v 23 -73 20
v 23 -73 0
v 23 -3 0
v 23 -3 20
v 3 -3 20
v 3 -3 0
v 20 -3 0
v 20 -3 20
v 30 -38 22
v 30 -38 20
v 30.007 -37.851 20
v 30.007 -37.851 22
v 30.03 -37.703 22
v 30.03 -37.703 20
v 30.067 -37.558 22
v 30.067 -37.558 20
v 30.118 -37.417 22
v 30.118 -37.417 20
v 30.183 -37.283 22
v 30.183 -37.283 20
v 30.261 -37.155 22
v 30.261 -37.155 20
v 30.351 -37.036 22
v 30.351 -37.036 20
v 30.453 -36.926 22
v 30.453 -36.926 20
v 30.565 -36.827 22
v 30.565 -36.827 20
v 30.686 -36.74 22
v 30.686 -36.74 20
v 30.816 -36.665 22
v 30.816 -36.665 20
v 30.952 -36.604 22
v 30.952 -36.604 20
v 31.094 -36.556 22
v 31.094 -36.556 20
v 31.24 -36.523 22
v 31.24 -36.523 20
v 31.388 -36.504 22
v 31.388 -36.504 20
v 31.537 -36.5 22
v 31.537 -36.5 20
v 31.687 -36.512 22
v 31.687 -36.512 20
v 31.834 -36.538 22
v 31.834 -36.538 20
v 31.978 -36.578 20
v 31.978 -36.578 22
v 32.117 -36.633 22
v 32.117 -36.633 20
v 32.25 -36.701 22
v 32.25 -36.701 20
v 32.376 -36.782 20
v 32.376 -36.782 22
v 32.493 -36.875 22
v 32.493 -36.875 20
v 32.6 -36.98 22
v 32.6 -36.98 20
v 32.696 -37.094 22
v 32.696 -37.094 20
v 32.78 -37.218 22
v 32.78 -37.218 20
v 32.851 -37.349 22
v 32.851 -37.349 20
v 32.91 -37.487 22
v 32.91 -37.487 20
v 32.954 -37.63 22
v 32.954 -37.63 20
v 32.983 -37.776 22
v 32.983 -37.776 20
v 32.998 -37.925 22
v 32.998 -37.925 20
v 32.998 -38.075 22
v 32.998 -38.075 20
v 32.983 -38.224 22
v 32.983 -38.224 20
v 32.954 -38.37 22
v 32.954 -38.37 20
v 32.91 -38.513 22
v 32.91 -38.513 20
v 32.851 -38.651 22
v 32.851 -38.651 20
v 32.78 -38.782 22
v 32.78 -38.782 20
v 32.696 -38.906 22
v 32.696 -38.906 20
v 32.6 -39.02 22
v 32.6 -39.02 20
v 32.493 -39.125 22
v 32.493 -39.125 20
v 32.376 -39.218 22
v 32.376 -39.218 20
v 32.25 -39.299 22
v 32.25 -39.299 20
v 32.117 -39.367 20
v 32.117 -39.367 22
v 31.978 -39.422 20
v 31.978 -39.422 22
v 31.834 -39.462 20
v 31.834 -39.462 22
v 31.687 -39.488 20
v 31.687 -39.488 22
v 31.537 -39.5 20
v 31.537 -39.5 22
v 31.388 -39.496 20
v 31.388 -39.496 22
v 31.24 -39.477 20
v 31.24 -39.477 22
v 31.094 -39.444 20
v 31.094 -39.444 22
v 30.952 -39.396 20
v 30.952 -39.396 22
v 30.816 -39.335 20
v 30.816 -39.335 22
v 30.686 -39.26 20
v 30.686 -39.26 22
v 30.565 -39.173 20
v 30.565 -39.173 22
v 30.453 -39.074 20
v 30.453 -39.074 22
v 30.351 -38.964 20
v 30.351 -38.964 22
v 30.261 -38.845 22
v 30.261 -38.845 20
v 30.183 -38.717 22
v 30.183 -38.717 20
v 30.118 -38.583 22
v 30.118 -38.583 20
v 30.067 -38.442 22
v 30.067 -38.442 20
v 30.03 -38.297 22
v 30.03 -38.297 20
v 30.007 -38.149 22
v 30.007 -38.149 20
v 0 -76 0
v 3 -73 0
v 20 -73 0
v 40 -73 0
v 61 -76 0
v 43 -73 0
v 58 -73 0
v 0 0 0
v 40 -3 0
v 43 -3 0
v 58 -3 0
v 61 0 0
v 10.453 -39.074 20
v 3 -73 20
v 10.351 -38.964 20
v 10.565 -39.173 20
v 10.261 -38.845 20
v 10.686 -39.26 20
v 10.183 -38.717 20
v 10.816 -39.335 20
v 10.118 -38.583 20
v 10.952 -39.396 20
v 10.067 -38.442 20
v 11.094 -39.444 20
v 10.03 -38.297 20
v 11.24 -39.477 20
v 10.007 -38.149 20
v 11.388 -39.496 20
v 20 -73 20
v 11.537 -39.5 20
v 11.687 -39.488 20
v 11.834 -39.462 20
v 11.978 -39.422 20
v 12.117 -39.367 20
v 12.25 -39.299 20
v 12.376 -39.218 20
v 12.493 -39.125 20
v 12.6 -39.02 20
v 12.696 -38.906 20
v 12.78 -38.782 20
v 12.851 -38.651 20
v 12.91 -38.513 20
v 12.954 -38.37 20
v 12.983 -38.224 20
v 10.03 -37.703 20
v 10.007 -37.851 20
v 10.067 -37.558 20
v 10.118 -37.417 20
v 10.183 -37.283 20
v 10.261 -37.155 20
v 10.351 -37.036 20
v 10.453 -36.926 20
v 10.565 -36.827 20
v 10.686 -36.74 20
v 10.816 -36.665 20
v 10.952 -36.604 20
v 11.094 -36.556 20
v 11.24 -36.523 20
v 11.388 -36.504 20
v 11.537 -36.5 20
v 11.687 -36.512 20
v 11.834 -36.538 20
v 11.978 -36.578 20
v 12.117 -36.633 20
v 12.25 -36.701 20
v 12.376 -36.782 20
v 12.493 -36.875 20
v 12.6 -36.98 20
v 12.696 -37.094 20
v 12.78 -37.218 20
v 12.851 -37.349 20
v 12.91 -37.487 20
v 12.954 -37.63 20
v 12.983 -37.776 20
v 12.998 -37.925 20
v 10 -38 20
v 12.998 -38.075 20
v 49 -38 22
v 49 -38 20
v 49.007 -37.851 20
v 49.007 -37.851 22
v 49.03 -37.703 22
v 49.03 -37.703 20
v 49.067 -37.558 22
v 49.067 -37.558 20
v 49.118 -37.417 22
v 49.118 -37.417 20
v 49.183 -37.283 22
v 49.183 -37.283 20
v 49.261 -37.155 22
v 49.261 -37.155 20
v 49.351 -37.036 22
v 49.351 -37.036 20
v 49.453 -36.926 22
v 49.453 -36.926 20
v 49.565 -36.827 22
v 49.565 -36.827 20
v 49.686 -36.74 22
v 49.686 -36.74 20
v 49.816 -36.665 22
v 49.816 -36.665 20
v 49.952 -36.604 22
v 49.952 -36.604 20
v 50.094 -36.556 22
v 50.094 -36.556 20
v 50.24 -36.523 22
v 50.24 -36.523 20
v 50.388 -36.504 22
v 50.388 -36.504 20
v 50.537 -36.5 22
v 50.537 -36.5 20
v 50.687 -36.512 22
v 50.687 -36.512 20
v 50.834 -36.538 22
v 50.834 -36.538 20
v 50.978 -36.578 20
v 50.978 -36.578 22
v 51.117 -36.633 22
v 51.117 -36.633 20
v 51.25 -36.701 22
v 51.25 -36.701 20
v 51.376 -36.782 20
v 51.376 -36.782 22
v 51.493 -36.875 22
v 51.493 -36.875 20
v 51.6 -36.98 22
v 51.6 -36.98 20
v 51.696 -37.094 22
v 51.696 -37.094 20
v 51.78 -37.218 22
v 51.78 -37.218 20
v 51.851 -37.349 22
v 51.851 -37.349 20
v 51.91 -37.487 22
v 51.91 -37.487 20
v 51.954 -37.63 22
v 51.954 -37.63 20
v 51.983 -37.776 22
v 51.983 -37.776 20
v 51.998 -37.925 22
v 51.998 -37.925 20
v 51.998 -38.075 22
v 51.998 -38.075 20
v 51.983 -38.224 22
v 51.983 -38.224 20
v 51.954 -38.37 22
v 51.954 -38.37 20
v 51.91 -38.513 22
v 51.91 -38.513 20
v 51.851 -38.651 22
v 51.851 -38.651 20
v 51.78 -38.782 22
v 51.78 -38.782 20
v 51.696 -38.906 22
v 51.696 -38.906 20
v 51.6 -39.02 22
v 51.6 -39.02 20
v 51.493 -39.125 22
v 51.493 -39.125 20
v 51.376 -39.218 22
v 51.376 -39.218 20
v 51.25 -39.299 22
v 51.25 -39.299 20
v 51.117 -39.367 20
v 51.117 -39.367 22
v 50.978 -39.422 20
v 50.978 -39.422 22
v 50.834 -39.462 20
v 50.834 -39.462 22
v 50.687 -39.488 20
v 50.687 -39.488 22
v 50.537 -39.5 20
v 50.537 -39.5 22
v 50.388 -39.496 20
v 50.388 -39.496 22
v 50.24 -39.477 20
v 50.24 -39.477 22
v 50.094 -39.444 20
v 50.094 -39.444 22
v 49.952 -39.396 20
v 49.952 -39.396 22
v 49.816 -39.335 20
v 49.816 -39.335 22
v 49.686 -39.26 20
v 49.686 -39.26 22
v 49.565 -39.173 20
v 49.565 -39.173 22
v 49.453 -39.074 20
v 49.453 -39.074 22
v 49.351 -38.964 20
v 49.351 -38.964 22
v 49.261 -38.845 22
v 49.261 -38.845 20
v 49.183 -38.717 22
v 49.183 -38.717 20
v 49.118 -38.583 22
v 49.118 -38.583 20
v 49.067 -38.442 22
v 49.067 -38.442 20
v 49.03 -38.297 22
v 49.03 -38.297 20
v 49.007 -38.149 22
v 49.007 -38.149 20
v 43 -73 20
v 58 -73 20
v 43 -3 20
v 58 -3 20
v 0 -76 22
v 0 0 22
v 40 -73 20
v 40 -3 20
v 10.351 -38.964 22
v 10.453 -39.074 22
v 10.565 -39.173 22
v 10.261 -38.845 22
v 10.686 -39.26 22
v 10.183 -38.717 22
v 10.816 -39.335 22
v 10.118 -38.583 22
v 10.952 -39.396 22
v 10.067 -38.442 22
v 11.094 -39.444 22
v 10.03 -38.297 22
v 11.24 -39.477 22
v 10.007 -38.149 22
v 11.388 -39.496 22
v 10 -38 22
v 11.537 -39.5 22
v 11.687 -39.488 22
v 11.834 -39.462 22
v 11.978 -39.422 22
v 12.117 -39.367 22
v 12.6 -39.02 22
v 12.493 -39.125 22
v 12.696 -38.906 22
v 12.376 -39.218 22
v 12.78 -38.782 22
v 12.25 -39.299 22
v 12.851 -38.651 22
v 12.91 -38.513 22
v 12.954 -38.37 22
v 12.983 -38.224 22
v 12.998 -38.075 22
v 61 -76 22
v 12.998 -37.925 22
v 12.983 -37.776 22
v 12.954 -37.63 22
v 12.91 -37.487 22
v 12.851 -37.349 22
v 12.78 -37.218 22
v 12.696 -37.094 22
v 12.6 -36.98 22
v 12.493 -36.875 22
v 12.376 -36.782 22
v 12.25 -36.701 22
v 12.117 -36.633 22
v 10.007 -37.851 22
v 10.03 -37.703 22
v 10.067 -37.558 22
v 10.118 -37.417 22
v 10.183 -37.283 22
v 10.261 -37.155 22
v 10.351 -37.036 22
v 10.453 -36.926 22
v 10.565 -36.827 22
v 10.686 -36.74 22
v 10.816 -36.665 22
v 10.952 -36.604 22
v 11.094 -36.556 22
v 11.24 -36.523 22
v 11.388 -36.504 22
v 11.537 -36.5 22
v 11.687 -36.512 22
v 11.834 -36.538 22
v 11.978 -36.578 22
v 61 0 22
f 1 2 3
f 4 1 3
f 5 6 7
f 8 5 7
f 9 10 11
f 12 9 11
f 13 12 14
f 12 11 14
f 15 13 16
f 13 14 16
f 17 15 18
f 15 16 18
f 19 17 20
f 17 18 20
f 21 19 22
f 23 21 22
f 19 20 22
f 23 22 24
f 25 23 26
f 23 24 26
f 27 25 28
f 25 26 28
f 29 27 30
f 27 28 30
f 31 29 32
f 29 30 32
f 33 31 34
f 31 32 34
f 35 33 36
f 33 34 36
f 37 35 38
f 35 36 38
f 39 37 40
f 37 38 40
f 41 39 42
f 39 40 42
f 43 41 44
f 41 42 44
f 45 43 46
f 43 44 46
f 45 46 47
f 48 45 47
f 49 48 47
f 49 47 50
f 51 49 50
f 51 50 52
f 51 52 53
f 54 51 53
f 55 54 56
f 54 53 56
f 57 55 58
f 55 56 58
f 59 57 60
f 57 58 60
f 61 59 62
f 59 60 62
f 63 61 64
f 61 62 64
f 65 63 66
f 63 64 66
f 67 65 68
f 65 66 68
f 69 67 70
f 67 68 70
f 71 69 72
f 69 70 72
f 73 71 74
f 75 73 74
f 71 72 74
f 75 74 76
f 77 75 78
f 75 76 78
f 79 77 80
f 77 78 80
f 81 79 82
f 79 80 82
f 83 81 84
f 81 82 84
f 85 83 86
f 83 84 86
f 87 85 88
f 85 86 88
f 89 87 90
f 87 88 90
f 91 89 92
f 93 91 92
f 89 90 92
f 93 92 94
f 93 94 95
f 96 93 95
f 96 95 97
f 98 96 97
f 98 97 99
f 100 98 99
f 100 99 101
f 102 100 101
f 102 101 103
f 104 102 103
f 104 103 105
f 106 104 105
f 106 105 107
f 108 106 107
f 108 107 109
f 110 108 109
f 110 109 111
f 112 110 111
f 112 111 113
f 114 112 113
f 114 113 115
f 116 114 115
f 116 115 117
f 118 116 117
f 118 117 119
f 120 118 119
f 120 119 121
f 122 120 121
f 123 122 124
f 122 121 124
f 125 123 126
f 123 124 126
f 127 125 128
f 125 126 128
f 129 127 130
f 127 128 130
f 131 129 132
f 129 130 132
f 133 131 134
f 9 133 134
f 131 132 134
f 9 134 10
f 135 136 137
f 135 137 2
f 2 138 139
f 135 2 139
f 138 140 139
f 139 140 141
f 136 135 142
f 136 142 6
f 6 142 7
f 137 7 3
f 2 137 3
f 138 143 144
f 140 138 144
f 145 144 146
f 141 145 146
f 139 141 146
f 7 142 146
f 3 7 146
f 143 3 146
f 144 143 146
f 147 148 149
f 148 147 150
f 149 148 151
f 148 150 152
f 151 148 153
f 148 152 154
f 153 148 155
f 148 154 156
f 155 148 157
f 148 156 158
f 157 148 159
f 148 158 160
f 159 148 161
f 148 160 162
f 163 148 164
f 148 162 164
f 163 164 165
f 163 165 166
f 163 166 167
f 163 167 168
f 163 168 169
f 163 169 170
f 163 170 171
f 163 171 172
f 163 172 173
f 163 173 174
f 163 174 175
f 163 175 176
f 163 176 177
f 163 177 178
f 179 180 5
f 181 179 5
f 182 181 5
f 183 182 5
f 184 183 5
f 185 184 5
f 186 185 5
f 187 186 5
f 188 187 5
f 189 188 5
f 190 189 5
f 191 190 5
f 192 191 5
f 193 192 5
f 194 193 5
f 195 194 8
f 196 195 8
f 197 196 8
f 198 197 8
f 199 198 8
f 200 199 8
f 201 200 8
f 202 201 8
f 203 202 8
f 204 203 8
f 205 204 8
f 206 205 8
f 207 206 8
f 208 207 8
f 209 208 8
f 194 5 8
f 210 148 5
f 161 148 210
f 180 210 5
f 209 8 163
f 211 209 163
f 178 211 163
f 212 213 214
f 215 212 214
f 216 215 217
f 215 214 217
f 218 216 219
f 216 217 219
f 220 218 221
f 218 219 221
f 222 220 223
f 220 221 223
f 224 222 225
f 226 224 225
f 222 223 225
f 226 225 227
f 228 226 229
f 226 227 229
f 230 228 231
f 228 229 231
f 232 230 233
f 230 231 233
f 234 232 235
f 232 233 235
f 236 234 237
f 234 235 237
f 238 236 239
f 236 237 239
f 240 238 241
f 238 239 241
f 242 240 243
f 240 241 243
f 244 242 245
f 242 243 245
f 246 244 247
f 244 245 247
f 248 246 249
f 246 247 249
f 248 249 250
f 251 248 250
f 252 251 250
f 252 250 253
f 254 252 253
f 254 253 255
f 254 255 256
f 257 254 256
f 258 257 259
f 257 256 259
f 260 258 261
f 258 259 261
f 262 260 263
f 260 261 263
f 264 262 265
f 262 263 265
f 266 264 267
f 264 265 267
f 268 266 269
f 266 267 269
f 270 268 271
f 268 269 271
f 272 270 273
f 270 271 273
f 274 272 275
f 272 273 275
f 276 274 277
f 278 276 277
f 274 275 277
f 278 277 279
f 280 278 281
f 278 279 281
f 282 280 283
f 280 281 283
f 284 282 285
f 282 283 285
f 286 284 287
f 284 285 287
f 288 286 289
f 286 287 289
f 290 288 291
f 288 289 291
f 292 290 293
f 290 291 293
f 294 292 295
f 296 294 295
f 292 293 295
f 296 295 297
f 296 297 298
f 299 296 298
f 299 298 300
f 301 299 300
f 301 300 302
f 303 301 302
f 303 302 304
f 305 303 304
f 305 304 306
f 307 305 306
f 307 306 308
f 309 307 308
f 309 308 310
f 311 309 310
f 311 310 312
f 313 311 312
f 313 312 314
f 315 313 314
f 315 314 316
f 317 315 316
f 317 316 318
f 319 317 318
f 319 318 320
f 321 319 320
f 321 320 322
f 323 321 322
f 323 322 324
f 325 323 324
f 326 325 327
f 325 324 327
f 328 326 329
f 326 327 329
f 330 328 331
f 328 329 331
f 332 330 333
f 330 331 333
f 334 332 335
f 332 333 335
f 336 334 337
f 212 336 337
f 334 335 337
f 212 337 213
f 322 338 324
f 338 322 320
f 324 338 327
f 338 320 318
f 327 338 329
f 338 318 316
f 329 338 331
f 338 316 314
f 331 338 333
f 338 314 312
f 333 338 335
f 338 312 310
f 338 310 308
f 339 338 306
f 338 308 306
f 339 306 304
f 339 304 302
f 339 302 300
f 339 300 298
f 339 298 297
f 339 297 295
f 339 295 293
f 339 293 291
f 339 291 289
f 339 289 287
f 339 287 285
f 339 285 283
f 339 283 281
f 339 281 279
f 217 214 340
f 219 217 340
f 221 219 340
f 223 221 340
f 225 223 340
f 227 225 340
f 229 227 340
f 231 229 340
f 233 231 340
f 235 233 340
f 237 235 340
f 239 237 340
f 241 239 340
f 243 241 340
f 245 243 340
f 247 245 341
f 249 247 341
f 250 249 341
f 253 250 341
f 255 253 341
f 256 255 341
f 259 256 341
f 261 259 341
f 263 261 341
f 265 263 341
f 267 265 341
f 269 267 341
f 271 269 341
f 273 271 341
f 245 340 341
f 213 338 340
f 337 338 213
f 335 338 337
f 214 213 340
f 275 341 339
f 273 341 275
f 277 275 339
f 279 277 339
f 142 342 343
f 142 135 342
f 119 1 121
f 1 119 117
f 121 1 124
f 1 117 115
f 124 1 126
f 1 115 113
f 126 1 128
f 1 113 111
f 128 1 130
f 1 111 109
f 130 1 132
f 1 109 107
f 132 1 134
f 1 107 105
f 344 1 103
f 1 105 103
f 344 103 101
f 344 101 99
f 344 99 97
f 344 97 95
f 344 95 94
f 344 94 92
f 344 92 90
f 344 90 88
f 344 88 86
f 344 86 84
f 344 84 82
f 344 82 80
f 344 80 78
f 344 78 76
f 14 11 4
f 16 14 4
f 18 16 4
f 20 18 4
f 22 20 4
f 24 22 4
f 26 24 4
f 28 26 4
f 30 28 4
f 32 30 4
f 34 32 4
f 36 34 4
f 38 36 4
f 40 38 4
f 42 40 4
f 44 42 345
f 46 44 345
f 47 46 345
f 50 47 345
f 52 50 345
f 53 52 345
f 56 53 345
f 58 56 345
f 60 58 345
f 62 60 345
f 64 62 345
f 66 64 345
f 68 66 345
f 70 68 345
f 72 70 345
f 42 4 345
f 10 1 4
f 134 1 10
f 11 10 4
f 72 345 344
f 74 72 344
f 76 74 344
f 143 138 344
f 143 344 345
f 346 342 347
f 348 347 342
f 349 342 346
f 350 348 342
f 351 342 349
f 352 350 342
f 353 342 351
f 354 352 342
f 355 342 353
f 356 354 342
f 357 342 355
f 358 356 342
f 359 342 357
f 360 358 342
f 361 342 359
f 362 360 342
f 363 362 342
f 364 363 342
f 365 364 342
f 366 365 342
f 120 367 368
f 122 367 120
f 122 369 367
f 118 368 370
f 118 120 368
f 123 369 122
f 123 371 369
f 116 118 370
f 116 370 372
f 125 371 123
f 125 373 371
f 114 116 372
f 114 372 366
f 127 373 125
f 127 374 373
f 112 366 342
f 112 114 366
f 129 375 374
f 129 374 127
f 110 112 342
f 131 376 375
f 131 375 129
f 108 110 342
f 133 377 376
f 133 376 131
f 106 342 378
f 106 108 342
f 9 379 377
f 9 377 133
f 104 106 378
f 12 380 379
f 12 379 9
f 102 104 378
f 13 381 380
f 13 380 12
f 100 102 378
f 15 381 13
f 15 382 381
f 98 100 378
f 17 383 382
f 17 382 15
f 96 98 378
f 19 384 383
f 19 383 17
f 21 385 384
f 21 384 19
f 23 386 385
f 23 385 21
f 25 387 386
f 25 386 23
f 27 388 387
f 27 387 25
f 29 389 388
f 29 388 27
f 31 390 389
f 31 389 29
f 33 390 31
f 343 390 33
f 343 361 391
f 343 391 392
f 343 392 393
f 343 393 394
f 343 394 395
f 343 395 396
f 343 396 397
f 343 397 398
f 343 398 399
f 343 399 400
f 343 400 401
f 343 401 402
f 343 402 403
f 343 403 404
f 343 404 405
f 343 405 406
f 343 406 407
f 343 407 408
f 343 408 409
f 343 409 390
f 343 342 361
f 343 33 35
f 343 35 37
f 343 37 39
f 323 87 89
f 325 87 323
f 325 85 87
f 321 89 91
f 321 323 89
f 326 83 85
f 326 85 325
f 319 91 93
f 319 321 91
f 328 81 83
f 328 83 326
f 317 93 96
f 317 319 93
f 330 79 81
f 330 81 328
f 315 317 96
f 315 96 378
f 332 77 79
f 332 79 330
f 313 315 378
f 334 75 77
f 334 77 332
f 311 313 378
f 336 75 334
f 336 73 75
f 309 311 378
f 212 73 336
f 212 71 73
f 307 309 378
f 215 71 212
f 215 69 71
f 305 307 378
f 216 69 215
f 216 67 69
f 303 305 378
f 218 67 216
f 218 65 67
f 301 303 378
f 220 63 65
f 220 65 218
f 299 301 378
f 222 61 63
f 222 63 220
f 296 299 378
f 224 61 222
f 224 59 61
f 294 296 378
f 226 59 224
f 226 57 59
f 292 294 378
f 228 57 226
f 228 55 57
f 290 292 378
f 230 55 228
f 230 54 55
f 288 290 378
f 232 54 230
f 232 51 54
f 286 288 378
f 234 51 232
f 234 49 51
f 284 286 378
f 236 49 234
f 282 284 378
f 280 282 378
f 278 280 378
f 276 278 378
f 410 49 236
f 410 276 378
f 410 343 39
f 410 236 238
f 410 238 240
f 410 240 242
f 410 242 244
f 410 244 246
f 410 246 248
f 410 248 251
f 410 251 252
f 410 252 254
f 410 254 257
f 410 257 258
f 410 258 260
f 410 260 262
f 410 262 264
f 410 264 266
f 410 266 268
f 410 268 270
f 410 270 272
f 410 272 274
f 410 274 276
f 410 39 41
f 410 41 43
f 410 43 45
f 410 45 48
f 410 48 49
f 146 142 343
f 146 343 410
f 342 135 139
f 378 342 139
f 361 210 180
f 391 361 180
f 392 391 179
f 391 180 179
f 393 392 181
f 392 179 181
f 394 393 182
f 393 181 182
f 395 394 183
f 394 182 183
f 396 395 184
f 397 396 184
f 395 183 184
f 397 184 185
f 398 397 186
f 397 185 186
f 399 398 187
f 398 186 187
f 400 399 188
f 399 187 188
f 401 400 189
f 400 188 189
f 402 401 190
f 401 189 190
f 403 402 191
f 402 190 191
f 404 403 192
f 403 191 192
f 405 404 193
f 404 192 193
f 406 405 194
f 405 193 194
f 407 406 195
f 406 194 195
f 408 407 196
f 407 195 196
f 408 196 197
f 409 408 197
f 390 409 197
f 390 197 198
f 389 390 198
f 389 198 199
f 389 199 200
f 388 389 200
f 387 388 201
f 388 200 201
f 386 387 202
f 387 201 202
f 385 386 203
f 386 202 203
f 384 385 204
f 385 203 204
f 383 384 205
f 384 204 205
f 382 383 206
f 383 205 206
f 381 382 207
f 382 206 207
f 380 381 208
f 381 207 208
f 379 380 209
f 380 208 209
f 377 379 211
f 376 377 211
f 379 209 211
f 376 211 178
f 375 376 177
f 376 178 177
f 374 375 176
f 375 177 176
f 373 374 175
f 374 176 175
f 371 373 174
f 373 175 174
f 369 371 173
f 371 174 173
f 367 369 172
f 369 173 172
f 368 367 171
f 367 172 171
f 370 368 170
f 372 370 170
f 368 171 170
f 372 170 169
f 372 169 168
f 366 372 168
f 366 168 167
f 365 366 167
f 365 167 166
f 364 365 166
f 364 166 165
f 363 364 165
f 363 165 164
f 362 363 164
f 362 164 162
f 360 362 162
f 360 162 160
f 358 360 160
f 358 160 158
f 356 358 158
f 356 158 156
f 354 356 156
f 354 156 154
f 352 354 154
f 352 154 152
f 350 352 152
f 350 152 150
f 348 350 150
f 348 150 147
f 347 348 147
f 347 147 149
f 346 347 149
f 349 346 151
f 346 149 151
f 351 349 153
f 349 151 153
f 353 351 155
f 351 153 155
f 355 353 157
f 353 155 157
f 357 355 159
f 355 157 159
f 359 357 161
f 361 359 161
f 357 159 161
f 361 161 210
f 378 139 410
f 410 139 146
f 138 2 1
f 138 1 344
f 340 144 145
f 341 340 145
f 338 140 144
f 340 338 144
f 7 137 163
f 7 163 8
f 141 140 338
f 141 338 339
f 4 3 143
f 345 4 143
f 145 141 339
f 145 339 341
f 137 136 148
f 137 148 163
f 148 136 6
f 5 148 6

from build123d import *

# Parameters (mm, degrees)
SKETCH1_W               = 81
SKETCH1_H               = 76
SKETCH1_W_2             = 17
SKETCH1_H_2             = 70
SKETCH1_W_3             = 15
BOSS_EXTRUDE2_DEPTH     = 20
SKETCH3_W               = 81
SKETCH3_H               = 76
BOSS_EXTRUDE3_DEPTH     = 2
CUT_EXTRUDE2_DEPTH      = 2
SKETCH5_W               = 17
SKETCH5_H               = 70
SKETCH5_R               = 1.5
CUT_EXTRUDE3_DEPTH      = 21
CUT_EXTRUDE3_DEPTH_BACK = 3


with BuildPart() as part:
    # Sketch1 → Boss-Extrude2 (new body)
    with BuildSketch(Plane.XY):
        with Locations((40.5, -38)):
            Rectangle(SKETCH1_W, SKETCH1_H)
        with Locations((31.5, -38)):
            Rectangle(SKETCH1_W_2, SKETCH1_H_2, mode=Mode.SUBTRACT)
        with Locations((11.5, -38)):
            Rectangle(SKETCH1_W_2, SKETCH1_H_2, mode=Mode.SUBTRACT)
        with Locations((50.5, -38)):
            Rectangle(SKETCH1_W_3, SKETCH1_H_2, mode=Mode.SUBTRACT)
        with Locations((69.5, -38)):
            Rectangle(SKETCH1_W_2, SKETCH1_H_2, mode=Mode.SUBTRACT)
    extrude(amount=BOSS_EXTRUDE2_DEPTH)

    # Sketch3 → Boss-Extrude3 (add)
    with BuildSketch(Plane.XY.offset(20)):
        with Locations((40.5, -38)):
            Rectangle(SKETCH3_W, SKETCH3_H)
    extrude(amount=BOSS_EXTRUDE3_DEPTH)

    # Sketch4 → Cut-Extrude2 (cut)
    with BuildSketch(Plane(origin=(0, 0, 20), x_dir=(-1, 0, 0), z_dir=(0, 0, -1))):
        with BuildLine():
            ThreePointArc((-13, -38), (-11.5, -39.5), (-10, -38))
            Line((-10, -38), (-13, -38))
        make_face()
        with BuildLine():
            Line((-13, -38), (-10, -38))
            ThreePointArc((-10, -38), (-11.5, -36.5), (-13, -38))
        make_face()
        with BuildLine():
            ThreePointArc((-33, -38), (-31.5, -39.5), (-30, -38))
            Line((-30, -38), (-33, -38))
        make_face()
        with BuildLine():
            Line((-33, -38), (-30, -38))
            ThreePointArc((-30, -38), (-31.5, -36.5), (-33, -38))
        make_face()
        with BuildLine():
            ThreePointArc((-52, -38), (-50.5, -39.5), (-49, -38))
            Line((-49, -38), (-52, -38))
        make_face()
        with BuildLine():
            Line((-52, -38), (-49, -38))
            ThreePointArc((-49, -38), (-50.5, -36.5), (-52, -38))
        make_face()
        with BuildLine():
            ThreePointArc((-71, -38), (-69.5, -39.5), (-68, -38))
            Line((-68, -38), (-71, -38))
        make_face()
        with BuildLine():
            Line((-71, -38), (-68, -38))
            ThreePointArc((-68, -38), (-69.5, -36.5), (-71, -38))
        make_face()
    extrude(amount=-CUT_EXTRUDE2_DEPTH, mode=Mode.SUBTRACT)

    # Sketch5 → Cut-Extrude3 (cut, two sides)
    with BuildSketch(Plane(origin=(0, 0, 20), x_dir=(-1, 0, 0), z_dir=(0, 0, -1))) as cut_extrude3_sk:
        Polygon((-61, 3.586024283), (-61, -3), (-78, -3), (-78, -73), (-61, -73), (-61, -79.125259563), (-89.801346659, -78.428276056), (-91.298539163, 3.586024283), align=None)
        with Locations((-69.5, -38)):
            Rectangle(SKETCH5_W, SKETCH5_H)
        with Locations((-69.5, -38)):
            Circle(SKETCH5_R, mode=Mode.SUBTRACT)
    extrude(amount=CUT_EXTRUDE3_DEPTH, mode=Mode.SUBTRACT)
    extrude(cut_extrude3_sk.sketch, amount=-CUT_EXTRUDE3_DEPTH_BACK, mode=Mode.SUBTRACT)


solid = part.part
